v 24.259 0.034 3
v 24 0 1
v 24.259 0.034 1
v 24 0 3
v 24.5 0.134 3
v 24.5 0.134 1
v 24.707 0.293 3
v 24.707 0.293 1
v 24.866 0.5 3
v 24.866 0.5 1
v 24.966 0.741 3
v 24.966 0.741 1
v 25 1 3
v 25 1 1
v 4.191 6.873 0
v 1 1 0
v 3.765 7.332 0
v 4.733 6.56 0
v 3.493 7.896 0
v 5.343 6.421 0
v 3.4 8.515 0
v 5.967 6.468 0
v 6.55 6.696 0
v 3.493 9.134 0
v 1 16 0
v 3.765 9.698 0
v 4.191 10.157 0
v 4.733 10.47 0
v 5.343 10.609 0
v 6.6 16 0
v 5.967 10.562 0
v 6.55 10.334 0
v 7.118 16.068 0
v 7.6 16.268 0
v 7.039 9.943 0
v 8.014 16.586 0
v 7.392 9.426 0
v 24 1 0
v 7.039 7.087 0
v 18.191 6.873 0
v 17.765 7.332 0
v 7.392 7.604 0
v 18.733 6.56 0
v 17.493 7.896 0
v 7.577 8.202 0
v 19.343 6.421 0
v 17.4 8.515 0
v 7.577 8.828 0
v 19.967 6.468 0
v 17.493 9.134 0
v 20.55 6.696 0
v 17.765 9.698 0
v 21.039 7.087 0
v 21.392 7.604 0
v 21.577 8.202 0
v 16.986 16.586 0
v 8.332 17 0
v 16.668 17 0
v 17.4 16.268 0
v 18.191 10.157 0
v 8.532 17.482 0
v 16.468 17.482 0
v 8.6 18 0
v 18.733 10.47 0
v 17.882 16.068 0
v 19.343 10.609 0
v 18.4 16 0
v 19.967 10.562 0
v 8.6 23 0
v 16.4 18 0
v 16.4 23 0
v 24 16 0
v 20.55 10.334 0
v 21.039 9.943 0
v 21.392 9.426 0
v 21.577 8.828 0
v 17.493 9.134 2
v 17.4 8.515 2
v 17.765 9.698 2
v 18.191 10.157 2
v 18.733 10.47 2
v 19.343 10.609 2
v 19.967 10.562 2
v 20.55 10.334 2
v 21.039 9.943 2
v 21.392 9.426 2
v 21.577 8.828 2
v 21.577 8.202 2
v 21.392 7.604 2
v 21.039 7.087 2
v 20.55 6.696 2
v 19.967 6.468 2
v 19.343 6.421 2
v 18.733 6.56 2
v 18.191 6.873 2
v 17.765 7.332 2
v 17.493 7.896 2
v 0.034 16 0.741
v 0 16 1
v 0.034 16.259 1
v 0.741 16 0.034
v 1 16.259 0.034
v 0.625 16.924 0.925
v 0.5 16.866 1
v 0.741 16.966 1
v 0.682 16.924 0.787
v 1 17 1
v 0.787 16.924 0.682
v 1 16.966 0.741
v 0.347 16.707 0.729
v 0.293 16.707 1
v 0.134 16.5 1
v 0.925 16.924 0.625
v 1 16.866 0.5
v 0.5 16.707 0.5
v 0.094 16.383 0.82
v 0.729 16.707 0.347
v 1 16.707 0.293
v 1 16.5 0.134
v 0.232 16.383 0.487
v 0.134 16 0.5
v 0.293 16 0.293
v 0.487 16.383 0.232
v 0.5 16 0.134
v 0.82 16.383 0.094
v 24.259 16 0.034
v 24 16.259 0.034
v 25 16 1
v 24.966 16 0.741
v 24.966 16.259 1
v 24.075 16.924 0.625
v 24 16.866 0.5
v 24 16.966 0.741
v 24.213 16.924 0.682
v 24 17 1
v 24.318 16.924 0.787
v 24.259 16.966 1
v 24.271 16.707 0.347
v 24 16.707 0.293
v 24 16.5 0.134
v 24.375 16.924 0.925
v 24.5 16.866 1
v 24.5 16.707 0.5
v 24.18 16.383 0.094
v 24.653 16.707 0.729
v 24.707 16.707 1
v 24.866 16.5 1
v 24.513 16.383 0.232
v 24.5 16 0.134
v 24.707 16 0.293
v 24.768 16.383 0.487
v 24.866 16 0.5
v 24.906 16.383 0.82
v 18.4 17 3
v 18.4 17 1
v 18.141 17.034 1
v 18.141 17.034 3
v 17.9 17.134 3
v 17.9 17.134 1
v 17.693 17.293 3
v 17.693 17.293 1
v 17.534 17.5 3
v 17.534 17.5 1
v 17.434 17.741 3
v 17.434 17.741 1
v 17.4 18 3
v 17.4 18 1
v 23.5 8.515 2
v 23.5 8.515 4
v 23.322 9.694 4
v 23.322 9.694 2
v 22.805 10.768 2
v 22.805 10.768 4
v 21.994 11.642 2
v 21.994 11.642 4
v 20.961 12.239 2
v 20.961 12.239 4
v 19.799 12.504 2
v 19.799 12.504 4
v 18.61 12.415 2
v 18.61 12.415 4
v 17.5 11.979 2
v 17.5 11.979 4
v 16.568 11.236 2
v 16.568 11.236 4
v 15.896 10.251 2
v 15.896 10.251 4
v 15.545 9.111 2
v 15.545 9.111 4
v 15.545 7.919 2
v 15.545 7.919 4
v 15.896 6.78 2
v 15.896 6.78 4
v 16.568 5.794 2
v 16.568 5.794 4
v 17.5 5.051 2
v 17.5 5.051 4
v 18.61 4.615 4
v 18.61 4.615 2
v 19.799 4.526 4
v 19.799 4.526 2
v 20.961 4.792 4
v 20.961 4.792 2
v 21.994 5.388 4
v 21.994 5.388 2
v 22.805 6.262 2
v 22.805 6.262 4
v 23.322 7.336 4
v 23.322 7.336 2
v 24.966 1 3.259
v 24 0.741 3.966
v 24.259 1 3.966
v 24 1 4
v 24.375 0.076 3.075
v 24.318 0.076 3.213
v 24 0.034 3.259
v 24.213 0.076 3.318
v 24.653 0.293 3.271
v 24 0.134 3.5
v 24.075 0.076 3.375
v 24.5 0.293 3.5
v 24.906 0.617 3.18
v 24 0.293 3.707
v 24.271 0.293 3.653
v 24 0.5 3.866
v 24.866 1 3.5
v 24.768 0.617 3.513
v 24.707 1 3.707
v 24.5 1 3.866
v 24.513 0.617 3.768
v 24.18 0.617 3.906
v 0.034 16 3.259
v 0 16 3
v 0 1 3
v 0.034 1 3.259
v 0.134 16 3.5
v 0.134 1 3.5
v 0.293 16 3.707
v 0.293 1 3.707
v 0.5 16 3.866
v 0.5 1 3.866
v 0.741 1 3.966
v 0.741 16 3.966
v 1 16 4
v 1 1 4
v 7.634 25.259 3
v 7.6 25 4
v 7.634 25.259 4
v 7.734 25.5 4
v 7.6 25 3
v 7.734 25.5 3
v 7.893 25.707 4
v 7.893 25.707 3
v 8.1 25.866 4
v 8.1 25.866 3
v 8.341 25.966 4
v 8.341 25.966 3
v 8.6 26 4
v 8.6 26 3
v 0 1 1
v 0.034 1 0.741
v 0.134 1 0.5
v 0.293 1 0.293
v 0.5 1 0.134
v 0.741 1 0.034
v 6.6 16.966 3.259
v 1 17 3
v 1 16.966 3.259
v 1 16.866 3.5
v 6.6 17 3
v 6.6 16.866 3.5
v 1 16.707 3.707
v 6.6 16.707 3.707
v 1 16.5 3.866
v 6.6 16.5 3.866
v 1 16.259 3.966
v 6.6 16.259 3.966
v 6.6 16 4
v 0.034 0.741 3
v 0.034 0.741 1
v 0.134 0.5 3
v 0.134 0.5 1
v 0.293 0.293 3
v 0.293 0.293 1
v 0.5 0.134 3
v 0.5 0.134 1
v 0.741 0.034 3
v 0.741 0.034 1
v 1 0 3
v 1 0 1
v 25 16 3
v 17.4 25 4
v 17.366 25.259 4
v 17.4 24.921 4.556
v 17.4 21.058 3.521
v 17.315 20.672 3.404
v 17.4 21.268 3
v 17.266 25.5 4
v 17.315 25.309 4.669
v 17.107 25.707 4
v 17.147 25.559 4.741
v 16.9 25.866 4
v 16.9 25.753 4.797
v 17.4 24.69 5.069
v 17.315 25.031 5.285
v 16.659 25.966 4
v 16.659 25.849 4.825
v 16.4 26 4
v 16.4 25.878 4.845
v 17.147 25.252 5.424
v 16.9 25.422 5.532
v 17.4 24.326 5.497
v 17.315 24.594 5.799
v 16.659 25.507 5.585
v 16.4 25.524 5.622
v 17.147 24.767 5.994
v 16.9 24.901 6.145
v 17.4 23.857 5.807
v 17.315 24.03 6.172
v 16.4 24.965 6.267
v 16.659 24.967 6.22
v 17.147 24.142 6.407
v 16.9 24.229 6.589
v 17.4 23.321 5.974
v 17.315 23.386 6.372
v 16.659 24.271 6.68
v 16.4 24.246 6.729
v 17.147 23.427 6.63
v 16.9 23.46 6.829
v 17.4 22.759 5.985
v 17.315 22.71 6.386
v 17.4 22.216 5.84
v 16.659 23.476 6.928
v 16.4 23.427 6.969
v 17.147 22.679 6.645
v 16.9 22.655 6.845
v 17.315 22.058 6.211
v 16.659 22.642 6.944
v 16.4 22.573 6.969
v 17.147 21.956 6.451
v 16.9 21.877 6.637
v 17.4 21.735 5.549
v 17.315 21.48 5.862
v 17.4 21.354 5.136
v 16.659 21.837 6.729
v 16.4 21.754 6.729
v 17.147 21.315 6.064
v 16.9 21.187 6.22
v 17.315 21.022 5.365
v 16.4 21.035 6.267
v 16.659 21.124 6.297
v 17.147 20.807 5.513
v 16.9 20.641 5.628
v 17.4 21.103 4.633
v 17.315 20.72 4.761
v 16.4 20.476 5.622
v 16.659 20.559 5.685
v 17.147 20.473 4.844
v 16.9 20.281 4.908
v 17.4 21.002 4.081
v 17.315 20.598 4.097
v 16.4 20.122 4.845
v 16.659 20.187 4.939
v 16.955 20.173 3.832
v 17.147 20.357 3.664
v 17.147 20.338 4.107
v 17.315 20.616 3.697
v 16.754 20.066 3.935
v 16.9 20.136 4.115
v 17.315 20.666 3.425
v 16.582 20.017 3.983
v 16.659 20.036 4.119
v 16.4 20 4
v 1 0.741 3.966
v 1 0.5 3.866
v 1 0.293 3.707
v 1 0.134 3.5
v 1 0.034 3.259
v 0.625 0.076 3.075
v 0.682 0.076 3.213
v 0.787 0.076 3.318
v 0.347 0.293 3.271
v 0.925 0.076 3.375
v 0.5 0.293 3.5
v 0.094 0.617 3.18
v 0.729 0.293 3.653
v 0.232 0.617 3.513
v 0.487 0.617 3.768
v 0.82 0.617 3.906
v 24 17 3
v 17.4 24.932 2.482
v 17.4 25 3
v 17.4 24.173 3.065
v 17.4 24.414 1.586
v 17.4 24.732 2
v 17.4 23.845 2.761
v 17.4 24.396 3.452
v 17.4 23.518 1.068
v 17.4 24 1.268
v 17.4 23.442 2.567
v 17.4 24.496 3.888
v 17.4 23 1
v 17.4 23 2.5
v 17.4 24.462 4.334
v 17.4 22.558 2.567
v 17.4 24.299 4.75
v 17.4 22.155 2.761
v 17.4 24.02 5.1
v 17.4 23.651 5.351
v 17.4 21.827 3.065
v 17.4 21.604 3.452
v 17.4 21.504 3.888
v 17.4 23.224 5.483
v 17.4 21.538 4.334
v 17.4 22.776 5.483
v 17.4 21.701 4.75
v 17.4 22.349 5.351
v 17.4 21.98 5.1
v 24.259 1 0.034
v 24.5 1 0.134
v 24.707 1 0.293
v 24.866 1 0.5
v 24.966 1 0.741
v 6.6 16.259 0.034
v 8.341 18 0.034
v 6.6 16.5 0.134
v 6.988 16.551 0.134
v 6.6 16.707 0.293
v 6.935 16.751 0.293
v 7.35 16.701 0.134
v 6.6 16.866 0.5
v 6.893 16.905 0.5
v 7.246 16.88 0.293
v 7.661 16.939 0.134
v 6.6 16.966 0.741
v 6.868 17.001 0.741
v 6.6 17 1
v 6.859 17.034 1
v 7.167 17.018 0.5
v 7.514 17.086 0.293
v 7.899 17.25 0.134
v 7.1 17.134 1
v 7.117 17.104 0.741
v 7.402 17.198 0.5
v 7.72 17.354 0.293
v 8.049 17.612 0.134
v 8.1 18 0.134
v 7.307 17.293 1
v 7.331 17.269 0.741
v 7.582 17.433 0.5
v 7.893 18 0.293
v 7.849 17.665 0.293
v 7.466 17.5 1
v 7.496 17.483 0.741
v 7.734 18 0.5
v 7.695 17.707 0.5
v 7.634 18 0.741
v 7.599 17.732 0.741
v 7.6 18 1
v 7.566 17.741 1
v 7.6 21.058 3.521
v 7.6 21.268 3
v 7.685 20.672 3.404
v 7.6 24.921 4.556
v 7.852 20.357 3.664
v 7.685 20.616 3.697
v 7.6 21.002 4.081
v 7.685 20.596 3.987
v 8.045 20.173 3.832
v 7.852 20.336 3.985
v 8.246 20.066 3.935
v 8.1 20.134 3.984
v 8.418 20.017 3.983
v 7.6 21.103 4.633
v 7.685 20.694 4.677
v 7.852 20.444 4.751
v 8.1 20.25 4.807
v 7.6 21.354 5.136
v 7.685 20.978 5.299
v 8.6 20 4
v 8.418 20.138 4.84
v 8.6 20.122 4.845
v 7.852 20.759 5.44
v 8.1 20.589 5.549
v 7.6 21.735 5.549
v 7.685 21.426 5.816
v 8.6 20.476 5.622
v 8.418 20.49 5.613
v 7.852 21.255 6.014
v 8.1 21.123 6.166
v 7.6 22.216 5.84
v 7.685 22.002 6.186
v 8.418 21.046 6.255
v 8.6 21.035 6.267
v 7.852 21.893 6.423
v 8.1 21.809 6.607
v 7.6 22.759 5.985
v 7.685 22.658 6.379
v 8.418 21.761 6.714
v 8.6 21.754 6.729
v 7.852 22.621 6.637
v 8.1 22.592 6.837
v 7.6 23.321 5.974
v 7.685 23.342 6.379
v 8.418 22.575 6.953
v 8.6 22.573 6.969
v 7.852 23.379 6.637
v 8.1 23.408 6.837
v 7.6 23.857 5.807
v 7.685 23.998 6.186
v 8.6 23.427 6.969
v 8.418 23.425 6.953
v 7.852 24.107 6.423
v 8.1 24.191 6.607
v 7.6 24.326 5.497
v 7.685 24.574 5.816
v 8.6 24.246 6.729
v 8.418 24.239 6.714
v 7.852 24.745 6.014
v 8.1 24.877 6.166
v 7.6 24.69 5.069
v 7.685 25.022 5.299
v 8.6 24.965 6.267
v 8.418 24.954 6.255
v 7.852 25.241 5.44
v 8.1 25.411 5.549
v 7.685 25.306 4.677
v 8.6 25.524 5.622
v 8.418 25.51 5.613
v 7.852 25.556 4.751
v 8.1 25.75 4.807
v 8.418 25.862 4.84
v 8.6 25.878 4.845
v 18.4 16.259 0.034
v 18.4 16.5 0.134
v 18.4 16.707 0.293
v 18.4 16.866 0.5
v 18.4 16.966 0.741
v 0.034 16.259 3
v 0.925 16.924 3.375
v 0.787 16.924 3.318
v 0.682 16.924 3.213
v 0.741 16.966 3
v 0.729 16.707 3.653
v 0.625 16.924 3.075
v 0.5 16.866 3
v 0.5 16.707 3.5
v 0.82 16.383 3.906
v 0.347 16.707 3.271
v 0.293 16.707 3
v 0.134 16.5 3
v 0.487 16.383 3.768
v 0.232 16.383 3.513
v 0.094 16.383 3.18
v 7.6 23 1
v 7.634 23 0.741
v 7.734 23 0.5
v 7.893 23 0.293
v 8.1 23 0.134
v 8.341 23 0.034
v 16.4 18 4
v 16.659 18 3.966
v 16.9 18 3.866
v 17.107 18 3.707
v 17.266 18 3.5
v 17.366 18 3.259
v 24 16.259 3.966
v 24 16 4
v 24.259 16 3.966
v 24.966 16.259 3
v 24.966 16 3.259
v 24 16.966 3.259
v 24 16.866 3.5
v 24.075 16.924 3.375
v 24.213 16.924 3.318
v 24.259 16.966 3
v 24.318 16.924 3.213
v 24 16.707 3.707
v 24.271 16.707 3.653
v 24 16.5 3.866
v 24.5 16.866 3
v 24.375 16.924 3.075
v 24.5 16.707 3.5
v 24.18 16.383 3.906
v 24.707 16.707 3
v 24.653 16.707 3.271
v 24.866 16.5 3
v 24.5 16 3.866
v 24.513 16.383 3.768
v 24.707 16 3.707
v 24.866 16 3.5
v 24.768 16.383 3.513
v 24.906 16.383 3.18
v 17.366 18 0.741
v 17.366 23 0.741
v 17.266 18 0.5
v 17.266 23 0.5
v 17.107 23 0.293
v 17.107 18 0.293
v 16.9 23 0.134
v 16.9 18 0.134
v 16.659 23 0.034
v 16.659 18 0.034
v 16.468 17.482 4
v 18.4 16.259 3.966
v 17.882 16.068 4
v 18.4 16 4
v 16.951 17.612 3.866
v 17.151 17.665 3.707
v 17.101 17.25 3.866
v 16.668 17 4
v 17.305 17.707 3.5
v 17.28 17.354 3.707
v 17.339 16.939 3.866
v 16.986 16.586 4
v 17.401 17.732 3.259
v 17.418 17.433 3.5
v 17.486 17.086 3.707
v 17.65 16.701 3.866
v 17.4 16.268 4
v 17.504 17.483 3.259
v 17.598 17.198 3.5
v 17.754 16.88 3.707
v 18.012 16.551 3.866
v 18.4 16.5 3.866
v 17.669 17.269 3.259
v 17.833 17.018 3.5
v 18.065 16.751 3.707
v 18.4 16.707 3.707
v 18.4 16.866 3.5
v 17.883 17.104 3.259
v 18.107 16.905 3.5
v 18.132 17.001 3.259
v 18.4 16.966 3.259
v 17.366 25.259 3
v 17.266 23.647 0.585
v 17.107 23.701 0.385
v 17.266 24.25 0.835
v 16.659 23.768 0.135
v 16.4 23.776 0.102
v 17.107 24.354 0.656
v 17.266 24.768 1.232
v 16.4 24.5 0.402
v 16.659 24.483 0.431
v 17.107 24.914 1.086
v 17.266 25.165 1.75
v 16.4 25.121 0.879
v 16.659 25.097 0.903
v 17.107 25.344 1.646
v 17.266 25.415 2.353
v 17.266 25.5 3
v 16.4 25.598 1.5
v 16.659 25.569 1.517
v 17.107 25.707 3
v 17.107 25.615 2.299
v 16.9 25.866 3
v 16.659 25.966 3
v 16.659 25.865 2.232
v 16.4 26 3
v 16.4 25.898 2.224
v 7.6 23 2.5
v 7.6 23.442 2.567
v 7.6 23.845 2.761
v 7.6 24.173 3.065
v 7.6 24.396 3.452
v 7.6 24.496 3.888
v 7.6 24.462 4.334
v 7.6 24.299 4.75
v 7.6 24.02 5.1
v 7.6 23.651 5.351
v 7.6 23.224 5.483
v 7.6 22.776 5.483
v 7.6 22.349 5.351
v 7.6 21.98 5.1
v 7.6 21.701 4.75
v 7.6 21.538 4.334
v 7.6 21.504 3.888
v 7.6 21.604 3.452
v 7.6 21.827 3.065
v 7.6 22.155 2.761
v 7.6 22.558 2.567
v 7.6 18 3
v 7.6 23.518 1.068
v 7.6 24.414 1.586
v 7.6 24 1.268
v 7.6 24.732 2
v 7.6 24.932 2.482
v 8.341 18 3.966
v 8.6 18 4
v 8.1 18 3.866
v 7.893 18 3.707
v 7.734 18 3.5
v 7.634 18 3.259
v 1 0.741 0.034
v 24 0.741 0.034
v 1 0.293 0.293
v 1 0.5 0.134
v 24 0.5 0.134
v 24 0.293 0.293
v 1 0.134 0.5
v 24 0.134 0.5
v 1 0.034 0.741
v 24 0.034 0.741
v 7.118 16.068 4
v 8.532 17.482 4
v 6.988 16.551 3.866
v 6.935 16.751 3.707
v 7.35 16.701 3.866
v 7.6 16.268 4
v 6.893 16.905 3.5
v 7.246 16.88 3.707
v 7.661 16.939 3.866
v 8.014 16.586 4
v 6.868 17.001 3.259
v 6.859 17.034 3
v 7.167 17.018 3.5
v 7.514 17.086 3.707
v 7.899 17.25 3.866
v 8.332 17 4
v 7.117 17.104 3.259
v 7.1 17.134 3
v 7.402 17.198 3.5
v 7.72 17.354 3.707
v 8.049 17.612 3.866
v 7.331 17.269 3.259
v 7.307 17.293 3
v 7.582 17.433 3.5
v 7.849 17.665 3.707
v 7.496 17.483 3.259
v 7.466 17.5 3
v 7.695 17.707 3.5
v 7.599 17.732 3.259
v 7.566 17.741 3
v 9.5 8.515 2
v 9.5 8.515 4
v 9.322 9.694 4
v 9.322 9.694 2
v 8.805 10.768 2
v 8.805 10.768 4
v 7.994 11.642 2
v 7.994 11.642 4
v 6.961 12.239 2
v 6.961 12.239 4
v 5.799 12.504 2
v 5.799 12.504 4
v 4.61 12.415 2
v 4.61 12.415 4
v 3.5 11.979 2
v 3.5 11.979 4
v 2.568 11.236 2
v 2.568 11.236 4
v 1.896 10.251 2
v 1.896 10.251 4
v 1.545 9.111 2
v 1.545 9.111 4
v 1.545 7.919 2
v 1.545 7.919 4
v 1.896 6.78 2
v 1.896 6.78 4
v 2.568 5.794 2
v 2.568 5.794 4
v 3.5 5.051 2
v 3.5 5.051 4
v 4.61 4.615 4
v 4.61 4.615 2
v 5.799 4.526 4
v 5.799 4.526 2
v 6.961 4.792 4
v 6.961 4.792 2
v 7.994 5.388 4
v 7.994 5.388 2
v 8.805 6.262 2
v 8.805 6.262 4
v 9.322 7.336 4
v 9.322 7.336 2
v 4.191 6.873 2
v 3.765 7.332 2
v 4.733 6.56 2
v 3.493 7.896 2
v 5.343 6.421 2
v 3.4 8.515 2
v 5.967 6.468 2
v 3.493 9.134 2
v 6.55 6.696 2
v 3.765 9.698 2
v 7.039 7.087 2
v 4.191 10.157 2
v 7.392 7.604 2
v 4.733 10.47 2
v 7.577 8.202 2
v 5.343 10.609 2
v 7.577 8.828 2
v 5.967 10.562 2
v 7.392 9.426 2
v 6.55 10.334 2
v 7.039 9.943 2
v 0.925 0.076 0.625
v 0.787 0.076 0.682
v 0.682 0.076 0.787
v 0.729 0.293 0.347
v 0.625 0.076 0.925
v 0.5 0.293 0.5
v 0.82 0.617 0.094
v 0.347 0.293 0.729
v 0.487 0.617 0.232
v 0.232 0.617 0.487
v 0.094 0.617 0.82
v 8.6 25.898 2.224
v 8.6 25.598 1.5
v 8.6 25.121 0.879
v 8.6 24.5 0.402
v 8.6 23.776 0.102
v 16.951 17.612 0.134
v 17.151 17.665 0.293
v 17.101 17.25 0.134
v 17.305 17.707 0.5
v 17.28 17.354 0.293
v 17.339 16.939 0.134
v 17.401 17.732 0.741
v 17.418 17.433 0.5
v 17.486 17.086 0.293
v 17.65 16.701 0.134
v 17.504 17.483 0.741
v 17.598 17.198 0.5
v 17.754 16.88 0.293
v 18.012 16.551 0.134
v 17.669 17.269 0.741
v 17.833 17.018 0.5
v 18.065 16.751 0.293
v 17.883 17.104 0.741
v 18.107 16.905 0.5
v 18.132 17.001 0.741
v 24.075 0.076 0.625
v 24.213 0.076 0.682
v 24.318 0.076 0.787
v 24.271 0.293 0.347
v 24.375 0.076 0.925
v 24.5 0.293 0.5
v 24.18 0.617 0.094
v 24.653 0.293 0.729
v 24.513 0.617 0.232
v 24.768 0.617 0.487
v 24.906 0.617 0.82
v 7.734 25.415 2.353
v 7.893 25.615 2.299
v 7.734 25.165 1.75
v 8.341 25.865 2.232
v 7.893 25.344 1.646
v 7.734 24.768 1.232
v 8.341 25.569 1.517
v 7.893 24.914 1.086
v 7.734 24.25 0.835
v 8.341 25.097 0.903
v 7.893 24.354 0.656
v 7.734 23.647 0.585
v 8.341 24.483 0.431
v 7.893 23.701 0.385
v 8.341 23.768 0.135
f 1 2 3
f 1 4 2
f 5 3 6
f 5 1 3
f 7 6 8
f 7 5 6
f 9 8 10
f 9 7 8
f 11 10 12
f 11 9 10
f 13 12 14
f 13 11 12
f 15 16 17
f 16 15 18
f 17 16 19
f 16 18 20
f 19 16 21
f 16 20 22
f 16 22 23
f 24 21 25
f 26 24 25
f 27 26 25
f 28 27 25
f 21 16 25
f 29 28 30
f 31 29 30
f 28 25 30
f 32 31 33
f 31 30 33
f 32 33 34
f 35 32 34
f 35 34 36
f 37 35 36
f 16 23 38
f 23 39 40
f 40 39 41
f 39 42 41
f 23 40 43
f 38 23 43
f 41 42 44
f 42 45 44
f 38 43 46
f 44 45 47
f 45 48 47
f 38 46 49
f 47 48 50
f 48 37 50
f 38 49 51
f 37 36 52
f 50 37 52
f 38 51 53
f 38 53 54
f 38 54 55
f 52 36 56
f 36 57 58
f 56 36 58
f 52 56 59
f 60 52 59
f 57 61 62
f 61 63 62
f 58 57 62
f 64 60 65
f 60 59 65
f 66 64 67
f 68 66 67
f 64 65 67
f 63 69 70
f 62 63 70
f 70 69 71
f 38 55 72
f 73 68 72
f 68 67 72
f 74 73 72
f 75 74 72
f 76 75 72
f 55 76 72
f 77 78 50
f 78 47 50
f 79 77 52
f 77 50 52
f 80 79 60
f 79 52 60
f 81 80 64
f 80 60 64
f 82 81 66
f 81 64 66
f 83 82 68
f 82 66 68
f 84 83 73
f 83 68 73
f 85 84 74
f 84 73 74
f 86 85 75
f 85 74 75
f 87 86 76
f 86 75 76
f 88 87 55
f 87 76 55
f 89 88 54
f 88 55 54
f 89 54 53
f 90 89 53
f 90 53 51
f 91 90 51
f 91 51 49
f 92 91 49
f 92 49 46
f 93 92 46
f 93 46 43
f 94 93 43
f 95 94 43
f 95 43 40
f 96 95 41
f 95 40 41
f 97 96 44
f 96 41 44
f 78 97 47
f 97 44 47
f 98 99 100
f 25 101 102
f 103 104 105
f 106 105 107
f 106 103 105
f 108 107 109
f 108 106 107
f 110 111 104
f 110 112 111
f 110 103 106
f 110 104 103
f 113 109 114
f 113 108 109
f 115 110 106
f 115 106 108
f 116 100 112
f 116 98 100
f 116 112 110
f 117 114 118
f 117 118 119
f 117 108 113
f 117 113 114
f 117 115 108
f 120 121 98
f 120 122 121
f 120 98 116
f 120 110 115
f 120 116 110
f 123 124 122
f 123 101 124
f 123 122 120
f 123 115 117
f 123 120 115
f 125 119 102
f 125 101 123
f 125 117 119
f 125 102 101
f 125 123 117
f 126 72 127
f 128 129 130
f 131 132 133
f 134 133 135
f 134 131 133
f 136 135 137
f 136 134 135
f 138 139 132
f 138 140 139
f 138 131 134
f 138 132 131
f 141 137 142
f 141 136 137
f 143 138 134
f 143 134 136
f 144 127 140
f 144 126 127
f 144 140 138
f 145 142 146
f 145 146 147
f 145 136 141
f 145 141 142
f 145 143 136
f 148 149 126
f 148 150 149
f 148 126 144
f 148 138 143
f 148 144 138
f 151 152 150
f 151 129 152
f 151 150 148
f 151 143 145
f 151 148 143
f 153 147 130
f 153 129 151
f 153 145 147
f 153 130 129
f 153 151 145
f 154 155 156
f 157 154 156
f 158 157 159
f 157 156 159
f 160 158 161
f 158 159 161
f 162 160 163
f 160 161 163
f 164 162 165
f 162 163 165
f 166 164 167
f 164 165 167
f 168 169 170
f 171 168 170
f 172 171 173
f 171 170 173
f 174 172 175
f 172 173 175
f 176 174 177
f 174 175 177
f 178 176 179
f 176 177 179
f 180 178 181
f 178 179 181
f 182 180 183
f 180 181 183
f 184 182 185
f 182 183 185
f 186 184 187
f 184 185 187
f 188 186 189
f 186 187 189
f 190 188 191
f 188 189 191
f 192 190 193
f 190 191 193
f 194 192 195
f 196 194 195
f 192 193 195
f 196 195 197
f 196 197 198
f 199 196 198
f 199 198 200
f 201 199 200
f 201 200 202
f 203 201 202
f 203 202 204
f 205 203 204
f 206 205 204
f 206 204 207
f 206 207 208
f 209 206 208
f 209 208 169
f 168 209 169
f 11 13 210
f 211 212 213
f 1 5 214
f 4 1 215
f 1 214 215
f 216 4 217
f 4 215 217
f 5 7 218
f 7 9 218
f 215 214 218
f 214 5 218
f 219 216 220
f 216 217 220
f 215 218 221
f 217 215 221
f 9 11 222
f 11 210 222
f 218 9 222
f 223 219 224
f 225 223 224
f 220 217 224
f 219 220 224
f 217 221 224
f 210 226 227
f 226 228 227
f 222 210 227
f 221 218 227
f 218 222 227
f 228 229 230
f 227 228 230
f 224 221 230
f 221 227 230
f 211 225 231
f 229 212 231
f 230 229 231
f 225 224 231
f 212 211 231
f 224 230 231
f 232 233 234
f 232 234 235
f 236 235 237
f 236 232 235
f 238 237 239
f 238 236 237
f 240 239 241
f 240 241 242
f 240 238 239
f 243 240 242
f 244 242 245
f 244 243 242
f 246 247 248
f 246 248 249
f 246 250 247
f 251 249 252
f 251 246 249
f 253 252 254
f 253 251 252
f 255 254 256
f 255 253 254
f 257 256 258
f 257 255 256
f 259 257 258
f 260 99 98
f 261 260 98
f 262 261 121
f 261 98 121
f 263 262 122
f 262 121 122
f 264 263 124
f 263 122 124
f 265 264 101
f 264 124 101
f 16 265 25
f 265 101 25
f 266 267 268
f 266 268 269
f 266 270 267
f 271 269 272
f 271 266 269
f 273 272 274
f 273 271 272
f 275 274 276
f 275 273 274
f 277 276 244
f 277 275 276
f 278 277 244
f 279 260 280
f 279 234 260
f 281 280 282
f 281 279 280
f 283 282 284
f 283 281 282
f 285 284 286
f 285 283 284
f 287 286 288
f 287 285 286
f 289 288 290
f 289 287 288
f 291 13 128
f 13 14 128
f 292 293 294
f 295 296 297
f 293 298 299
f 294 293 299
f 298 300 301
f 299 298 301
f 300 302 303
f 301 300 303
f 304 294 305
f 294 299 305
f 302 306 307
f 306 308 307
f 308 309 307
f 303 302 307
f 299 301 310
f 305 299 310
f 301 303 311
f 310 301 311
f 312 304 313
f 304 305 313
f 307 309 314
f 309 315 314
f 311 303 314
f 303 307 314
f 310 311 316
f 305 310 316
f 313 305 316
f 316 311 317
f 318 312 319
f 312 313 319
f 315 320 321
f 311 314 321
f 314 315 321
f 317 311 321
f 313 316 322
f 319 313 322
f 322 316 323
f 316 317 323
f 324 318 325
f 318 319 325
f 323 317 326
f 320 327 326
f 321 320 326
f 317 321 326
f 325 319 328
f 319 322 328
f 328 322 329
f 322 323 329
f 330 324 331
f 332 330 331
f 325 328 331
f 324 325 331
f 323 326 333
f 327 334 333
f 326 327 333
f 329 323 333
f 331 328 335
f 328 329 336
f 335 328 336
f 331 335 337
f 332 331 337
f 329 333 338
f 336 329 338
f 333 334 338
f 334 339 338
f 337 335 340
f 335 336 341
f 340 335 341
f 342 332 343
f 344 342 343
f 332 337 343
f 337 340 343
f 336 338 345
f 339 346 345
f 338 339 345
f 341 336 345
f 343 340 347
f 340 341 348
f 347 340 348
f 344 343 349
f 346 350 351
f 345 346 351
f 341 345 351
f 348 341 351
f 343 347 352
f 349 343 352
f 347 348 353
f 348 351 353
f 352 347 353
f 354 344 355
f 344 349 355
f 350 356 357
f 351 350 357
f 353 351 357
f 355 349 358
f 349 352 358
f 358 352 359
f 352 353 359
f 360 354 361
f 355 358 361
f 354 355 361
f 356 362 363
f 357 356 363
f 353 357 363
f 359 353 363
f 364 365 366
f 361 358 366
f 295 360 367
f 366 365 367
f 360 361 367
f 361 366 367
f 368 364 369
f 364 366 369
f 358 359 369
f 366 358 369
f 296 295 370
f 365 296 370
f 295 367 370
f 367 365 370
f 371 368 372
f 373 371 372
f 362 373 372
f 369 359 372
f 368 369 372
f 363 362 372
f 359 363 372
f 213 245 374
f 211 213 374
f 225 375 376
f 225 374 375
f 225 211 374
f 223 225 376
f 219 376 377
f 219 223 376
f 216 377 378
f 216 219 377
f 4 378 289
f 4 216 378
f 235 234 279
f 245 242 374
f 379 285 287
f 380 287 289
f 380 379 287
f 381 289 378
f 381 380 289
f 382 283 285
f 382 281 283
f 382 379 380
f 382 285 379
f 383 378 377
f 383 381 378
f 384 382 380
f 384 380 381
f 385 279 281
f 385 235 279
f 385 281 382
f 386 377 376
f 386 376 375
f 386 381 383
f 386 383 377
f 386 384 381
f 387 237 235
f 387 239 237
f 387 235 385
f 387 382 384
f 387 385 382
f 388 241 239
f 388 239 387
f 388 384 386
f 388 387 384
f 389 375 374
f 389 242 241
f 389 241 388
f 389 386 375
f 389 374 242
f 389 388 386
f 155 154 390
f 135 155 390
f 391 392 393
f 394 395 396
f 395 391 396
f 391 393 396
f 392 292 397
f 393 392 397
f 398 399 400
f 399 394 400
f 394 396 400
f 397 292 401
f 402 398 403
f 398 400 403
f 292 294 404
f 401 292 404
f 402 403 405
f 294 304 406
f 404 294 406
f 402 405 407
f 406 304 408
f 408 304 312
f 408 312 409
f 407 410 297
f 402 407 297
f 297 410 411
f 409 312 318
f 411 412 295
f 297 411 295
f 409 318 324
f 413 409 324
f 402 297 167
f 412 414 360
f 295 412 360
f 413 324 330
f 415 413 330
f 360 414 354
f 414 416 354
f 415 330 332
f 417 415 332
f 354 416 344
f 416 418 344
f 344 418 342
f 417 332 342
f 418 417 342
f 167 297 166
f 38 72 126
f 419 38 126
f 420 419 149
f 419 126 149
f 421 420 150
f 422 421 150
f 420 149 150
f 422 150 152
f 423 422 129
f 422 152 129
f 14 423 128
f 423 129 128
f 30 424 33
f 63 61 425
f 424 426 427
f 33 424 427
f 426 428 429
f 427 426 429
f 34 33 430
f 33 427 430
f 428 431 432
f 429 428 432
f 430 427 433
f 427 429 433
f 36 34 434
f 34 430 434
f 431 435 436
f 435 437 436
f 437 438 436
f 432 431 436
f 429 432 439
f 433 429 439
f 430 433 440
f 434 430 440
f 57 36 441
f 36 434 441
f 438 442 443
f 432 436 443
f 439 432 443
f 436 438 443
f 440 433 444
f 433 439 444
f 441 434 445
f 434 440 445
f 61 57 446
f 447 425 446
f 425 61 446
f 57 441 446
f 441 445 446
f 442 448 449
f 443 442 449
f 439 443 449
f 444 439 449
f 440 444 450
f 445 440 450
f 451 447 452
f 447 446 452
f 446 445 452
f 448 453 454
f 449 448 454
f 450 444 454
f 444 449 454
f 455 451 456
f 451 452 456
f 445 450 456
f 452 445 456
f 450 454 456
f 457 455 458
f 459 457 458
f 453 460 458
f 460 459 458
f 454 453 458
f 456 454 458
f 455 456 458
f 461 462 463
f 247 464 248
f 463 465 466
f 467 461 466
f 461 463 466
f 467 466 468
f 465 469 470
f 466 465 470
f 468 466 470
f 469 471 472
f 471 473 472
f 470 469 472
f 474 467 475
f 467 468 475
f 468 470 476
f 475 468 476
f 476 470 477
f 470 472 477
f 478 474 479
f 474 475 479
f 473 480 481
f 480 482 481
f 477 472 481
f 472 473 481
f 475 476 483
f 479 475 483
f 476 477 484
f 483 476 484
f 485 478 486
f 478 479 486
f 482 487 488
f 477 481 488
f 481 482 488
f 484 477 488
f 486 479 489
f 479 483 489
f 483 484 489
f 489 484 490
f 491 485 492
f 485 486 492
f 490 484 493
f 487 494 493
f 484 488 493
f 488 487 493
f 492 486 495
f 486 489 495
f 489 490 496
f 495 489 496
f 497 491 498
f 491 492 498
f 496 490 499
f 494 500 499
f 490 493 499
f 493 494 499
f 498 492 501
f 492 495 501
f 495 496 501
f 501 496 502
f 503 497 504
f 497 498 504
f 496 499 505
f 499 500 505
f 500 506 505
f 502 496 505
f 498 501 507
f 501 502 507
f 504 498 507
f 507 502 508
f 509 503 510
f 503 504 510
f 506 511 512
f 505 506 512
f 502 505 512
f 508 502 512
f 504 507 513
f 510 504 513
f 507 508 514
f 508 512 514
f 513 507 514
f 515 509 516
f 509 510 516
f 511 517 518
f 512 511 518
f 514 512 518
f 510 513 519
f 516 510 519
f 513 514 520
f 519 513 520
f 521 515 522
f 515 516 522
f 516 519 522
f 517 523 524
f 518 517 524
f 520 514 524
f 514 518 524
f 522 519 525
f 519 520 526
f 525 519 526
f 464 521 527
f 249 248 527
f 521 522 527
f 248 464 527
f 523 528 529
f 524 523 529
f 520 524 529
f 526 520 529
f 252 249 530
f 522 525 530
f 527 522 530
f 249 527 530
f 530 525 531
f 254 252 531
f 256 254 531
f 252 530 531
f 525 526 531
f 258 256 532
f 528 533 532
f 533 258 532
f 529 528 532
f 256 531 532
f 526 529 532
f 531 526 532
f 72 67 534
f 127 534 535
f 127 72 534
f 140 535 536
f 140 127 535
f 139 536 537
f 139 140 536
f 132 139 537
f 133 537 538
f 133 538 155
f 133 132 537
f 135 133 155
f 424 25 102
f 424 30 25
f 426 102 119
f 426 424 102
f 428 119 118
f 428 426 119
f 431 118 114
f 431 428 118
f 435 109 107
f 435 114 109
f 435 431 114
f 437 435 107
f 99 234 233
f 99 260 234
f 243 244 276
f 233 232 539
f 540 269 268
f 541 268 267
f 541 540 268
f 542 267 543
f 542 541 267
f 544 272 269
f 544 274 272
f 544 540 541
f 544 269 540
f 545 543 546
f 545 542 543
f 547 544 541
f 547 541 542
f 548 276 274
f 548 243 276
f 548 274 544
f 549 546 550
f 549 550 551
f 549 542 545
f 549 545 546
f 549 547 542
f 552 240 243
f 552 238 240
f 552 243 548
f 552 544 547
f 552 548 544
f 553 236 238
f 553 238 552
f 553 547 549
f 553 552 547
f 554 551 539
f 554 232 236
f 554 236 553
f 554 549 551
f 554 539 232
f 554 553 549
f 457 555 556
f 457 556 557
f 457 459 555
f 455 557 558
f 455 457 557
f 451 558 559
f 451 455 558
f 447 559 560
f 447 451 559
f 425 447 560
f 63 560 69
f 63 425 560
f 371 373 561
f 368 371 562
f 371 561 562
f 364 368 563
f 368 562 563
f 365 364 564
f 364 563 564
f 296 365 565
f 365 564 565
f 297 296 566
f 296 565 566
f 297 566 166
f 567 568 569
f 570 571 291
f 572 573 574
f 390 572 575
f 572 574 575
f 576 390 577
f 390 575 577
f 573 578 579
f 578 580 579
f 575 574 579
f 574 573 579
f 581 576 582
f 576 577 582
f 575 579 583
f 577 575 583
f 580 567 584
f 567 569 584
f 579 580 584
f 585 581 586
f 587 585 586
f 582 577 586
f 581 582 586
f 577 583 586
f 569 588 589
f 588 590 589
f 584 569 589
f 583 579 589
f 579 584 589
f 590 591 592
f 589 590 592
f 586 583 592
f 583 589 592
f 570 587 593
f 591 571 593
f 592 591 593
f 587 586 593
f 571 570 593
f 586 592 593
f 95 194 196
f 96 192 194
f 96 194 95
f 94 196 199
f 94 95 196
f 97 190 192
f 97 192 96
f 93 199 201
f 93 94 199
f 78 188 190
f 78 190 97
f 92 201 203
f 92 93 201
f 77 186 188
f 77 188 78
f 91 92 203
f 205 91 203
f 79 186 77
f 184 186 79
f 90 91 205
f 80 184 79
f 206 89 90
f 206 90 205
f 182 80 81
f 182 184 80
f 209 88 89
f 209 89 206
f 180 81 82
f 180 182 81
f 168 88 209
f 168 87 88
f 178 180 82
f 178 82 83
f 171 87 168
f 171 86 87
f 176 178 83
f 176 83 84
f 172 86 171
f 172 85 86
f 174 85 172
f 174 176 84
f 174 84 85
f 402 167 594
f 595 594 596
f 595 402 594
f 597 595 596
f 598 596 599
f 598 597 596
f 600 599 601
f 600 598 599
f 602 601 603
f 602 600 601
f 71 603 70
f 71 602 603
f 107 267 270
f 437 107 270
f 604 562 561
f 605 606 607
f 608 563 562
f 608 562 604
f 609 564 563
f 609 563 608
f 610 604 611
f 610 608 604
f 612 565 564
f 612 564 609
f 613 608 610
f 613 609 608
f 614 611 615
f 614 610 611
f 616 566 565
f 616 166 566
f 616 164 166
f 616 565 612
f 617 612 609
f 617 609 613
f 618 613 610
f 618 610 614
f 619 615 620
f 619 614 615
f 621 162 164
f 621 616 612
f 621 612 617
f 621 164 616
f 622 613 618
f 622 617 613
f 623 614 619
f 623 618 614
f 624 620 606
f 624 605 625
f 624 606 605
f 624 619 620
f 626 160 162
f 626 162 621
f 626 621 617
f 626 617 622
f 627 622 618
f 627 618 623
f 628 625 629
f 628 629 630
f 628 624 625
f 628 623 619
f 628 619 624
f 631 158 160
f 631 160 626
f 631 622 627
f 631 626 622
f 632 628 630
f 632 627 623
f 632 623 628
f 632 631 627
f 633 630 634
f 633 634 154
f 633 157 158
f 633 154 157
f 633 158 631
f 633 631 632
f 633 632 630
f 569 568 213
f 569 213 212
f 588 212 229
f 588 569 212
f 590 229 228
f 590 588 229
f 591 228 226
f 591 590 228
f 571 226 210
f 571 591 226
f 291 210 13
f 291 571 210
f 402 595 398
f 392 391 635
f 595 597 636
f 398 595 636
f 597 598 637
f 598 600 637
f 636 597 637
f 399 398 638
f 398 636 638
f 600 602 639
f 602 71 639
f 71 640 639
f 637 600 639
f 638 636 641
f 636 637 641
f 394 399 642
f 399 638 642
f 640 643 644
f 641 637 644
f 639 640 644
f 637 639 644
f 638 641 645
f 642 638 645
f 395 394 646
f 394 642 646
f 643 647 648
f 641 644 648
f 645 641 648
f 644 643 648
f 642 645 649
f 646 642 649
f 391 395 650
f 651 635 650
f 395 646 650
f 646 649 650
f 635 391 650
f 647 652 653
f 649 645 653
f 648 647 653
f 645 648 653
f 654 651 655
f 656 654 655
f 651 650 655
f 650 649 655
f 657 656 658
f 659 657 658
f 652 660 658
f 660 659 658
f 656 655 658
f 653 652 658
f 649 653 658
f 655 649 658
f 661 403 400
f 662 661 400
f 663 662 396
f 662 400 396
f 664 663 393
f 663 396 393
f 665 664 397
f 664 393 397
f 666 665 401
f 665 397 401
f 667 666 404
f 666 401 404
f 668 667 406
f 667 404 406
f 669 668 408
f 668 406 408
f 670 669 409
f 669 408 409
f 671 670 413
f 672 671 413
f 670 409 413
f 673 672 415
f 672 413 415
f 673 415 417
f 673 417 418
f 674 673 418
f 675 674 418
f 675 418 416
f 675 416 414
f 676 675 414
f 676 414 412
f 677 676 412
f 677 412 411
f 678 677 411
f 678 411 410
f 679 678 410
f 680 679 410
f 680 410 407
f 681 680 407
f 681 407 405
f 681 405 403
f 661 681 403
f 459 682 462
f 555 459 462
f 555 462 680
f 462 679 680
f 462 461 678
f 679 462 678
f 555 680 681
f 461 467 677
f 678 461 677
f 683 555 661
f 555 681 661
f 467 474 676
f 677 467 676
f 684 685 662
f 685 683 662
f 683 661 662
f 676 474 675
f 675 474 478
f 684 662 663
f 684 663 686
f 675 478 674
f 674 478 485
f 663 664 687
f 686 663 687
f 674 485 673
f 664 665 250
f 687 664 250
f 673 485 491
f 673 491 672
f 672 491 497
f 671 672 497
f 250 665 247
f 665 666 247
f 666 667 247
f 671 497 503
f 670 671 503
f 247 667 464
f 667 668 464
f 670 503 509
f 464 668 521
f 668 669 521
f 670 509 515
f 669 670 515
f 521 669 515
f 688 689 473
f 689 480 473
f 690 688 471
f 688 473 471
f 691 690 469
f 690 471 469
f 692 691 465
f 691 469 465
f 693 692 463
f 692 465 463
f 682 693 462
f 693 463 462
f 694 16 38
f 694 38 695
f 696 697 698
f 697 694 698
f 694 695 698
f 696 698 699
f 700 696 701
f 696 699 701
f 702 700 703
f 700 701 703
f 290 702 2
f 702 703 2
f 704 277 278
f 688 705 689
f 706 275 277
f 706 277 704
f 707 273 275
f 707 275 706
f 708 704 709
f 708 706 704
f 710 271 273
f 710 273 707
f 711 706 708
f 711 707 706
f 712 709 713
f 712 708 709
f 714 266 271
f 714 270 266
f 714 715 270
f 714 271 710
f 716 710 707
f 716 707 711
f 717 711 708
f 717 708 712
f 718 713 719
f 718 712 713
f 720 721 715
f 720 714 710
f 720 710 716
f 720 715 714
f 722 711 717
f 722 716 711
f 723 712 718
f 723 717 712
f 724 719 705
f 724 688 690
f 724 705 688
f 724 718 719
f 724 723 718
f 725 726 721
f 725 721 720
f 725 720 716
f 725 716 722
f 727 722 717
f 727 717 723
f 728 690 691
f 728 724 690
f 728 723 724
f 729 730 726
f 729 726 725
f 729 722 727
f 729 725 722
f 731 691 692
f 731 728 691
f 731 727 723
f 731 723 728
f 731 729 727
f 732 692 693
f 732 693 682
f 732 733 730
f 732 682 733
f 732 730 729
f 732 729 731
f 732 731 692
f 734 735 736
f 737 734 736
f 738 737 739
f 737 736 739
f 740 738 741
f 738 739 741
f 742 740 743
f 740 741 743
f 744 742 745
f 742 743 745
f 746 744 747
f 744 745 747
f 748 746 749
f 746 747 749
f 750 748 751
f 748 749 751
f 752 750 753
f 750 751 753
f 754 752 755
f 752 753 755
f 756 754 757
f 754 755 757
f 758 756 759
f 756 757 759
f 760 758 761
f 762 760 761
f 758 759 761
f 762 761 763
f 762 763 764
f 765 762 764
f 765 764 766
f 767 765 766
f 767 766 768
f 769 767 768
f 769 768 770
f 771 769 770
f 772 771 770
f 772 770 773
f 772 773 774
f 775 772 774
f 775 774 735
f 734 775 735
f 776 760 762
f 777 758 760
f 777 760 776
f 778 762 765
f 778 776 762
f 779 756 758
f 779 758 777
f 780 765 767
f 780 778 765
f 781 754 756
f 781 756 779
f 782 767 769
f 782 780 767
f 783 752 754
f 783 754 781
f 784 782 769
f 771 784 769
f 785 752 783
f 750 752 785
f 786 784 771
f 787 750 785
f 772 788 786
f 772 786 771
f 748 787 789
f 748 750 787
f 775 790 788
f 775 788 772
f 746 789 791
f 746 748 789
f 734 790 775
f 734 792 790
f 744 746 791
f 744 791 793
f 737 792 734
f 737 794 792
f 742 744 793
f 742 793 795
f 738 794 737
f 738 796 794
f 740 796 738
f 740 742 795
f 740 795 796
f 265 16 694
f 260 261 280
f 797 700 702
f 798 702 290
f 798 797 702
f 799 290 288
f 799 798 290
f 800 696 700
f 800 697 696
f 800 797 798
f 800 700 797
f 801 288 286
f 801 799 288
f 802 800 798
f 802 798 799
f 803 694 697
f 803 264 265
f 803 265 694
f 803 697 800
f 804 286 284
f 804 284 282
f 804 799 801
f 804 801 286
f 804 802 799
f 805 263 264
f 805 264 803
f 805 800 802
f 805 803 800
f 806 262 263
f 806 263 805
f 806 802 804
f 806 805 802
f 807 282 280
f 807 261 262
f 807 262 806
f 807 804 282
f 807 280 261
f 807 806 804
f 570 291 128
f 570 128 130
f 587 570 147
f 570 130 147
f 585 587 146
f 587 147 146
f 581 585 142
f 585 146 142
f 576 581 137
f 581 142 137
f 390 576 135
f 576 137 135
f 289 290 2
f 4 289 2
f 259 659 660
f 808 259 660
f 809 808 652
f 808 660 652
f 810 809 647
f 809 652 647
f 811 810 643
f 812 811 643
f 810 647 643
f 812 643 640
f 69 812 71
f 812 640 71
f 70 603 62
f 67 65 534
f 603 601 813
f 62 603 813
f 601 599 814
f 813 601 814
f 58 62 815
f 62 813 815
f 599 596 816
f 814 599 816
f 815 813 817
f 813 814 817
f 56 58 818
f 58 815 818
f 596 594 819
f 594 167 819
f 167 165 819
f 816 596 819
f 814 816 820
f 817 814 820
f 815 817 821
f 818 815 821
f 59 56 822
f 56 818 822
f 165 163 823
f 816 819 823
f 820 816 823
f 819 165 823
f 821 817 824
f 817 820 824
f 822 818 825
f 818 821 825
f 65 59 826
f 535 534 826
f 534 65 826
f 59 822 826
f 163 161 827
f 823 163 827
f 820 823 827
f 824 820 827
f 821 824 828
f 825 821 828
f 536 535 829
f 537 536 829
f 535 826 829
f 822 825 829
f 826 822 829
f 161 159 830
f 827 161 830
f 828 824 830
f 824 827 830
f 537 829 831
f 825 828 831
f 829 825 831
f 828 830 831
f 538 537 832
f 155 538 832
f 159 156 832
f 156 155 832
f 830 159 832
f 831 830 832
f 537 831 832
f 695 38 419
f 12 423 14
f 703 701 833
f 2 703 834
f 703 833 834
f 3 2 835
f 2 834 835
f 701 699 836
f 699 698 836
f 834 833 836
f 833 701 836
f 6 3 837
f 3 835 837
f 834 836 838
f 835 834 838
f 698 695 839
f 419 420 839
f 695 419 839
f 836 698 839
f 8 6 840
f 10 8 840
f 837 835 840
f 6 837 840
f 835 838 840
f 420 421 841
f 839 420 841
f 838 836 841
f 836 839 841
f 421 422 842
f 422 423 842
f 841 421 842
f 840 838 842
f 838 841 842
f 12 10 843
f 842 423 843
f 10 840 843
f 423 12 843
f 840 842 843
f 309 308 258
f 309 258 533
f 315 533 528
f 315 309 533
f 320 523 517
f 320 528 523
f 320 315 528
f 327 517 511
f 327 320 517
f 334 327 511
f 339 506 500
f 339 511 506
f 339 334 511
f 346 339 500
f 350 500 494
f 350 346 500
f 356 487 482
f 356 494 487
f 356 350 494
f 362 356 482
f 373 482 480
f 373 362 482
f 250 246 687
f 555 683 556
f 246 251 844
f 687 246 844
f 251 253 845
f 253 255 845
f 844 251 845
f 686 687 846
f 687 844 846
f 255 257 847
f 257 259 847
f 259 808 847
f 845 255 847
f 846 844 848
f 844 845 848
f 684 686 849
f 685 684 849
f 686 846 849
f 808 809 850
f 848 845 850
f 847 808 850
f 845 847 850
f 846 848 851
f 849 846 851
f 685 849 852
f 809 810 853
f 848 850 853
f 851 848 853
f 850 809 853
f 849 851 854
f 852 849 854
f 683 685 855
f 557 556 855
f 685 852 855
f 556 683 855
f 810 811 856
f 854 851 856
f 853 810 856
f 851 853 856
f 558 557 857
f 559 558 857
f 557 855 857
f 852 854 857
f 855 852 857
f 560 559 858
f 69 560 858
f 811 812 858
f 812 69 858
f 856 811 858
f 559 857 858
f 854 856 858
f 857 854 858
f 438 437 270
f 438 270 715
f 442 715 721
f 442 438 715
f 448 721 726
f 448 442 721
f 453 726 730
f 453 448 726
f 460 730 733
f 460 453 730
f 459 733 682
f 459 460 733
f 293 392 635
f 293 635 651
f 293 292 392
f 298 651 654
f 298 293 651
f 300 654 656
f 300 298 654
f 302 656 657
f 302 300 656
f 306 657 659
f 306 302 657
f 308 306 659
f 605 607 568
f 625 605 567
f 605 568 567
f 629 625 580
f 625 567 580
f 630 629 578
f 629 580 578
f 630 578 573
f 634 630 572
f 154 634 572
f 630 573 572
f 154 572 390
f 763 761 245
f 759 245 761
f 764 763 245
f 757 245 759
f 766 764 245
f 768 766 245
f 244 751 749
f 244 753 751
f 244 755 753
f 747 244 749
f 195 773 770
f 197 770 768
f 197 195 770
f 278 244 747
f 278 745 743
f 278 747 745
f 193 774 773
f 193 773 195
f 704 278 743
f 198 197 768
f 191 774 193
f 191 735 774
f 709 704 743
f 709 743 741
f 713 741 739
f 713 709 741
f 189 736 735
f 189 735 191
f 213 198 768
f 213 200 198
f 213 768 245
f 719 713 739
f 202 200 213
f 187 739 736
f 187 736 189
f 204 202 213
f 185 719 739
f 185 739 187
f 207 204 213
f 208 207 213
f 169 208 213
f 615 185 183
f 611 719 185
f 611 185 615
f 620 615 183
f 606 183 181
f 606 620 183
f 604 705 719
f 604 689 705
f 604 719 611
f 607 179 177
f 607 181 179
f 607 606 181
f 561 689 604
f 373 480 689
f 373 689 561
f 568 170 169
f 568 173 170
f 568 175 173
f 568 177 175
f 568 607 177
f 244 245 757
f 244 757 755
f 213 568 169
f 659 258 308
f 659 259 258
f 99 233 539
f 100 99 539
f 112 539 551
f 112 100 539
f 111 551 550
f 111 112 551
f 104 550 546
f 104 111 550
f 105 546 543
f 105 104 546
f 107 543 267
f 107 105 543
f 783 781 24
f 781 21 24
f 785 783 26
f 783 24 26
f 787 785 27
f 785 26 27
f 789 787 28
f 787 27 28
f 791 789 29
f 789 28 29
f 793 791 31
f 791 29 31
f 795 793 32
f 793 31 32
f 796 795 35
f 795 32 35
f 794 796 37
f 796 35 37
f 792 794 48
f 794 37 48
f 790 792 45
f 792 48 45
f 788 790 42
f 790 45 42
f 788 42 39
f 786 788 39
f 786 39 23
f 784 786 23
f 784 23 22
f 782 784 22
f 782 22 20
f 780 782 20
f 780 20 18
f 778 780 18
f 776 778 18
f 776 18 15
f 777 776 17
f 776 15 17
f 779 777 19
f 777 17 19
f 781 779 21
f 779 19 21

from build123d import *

# Parameters (mm, degrees)
ESQUISSE1_W                                       = 25
ESQUISSE1_H                                       = 26
BOSS_EXTRU_1_DEPTH                                = 4
BOSS_EXTRU_2_DEPTH                                = 25
ESQUISSE3_R                                       = 1.5
ENL_V_MAT_EXTRU_1_DEPTH                           = 25
ENL_V_MAT_EXTRU_2_DEPTH                           = 25
ENL_V_MAT_EXTRU_2_DEPTH_BACK                      = 25
ESQUISSE4_W                                       = 7.6
ESQUISSE4_H                                       = 9
CHAMBRAGE_POUR_VIS_SIX_PANS_CREUX_M41_D           = 4.2
CHAMBRAGE_POUR_VIS_SIX_PANS_CREUX_M41_CBORE_D     = 8
CHAMBRAGE_POUR_VIS_SIX_PANS_CREUX_M41_CBORE_DEPTH = 2
CONG_1_R                                          = 1


with BuildPart() as part:
    # Esquisse1 → Boss.-Extru.1 (new body)
    with BuildSketch(Plane.XY):
        with Locations((12.5, 13)):
            Rectangle(ESQUISSE1_W, ESQUISSE1_H)
    extrude(amount=BOSS_EXTRU_1_DEPTH)

    # Esquisse2 → Boss.-Extru.2 (add)
    with BuildSketch(Plane(origin=(25, 0, 0), x_dir=(0, 0, -1), z_dir=(1, 0, 0))):
        with BuildLine():
            Line((-4, 20), (-4, 26))
            ThreePointArc((-4, 26), (-7, 23), (-4, 20))
        make_face()
    extrude(amount=-BOSS_EXTRU_2_DEPTH)

    # Esquisse3 → Enlèv. mat.-Extru.1 (cut)
    with BuildSketch(Plane(origin=(25, 0, 0), x_dir=(0, 0, -1), z_dir=(1, 0, 0))):
        with BuildLine():
            ThreePointArc((-3, 26), (-0.878679656, 25.121320344), (0, 23))
            Line((0, 23), (0, 26))
            Line((0, 26), (-3, 26))
        make_face()
        with Locations((-4, 23)):
            Circle(ESQUISSE3_R)
    extrude(amount=-ENL_V_MAT_EXTRU_1_DEPTH, mode=Mode.SUBTRACT)

    # Esquisse4 → Enlèv. mat.-Extru.2 (cut, two sides: drawn at the far end of the back side and taken through both)
    with BuildSketch(Plane.XY.offset(4).offset(-ENL_V_MAT_EXTRU_2_DEPTH_BACK)):
        with Locations((3.8, 21.5)):
            Rectangle(ESQUISSE4_W, ESQUISSE4_H)
        with Locations((21.2, 21.5)):
            Rectangle(ESQUISSE4_W, ESQUISSE4_H)
    extrude(amount=ENL_V_MAT_EXTRU_2_DEPTH + ENL_V_MAT_EXTRU_2_DEPTH_BACK, mode=Mode.SUBTRACT)

    # Chambrage pour vis à six pans creux M41 (through all)
    with Locations(Plane(origin=(5.5, 8.51504076, 4), x_dir=(1, 0, 0), z_dir=(0, 0, 1))):
        with Locations((0, 0), (14, 0)):
            CounterBoreHole(CHAMBRAGE_POUR_VIS_SIX_PANS_CREUX_M41_D / 2, CHAMBRAGE_POUR_VIS_SIX_PANS_CREUX_M41_CBORE_D / 2, CHAMBRAGE_POUR_VIS_SIX_PANS_CREUX_M41_CBORE_DEPTH)

    # Congé1
    cong_1_edges = [part.edges().sort_by_distance(p)[0] for p in [
        (7.6, 23, 7),
        (7.6, 26, 3.5),
        (7.6, 25.121320344, 0.878679656),
        (7.6, 20, 0),
        (7.6, 18.5, 4),
        (17.4, 20, 0),
        (17.4, 25.121320344, 0.878679656),
        (17.4, 26, 3.5),
        (12.5, 0, 4),
        (12.5, 0, 0),
        (0, 8.5, 4),
        (0, 0, 2),
        (0, 8.5, 0),
        (3.8, 17, 0),
        (7.6, 17, 2),
        (3.8, 17, 4),
        (0, 17, 2),
        (25, 0, 2),
        (25, 8.5, 4),
        (25, 8.5, 0),
        (25, 17, 2),
        (21.2, 17, 4),
        (17.4, 17, 2),
        (21.2, 17, 0),
        (17.4, 18.5, 4),
        (17.4, 23, 7),
    ]]
    fillet(cong_1_edges, radius=CONG_1_R)


solid = part.part
